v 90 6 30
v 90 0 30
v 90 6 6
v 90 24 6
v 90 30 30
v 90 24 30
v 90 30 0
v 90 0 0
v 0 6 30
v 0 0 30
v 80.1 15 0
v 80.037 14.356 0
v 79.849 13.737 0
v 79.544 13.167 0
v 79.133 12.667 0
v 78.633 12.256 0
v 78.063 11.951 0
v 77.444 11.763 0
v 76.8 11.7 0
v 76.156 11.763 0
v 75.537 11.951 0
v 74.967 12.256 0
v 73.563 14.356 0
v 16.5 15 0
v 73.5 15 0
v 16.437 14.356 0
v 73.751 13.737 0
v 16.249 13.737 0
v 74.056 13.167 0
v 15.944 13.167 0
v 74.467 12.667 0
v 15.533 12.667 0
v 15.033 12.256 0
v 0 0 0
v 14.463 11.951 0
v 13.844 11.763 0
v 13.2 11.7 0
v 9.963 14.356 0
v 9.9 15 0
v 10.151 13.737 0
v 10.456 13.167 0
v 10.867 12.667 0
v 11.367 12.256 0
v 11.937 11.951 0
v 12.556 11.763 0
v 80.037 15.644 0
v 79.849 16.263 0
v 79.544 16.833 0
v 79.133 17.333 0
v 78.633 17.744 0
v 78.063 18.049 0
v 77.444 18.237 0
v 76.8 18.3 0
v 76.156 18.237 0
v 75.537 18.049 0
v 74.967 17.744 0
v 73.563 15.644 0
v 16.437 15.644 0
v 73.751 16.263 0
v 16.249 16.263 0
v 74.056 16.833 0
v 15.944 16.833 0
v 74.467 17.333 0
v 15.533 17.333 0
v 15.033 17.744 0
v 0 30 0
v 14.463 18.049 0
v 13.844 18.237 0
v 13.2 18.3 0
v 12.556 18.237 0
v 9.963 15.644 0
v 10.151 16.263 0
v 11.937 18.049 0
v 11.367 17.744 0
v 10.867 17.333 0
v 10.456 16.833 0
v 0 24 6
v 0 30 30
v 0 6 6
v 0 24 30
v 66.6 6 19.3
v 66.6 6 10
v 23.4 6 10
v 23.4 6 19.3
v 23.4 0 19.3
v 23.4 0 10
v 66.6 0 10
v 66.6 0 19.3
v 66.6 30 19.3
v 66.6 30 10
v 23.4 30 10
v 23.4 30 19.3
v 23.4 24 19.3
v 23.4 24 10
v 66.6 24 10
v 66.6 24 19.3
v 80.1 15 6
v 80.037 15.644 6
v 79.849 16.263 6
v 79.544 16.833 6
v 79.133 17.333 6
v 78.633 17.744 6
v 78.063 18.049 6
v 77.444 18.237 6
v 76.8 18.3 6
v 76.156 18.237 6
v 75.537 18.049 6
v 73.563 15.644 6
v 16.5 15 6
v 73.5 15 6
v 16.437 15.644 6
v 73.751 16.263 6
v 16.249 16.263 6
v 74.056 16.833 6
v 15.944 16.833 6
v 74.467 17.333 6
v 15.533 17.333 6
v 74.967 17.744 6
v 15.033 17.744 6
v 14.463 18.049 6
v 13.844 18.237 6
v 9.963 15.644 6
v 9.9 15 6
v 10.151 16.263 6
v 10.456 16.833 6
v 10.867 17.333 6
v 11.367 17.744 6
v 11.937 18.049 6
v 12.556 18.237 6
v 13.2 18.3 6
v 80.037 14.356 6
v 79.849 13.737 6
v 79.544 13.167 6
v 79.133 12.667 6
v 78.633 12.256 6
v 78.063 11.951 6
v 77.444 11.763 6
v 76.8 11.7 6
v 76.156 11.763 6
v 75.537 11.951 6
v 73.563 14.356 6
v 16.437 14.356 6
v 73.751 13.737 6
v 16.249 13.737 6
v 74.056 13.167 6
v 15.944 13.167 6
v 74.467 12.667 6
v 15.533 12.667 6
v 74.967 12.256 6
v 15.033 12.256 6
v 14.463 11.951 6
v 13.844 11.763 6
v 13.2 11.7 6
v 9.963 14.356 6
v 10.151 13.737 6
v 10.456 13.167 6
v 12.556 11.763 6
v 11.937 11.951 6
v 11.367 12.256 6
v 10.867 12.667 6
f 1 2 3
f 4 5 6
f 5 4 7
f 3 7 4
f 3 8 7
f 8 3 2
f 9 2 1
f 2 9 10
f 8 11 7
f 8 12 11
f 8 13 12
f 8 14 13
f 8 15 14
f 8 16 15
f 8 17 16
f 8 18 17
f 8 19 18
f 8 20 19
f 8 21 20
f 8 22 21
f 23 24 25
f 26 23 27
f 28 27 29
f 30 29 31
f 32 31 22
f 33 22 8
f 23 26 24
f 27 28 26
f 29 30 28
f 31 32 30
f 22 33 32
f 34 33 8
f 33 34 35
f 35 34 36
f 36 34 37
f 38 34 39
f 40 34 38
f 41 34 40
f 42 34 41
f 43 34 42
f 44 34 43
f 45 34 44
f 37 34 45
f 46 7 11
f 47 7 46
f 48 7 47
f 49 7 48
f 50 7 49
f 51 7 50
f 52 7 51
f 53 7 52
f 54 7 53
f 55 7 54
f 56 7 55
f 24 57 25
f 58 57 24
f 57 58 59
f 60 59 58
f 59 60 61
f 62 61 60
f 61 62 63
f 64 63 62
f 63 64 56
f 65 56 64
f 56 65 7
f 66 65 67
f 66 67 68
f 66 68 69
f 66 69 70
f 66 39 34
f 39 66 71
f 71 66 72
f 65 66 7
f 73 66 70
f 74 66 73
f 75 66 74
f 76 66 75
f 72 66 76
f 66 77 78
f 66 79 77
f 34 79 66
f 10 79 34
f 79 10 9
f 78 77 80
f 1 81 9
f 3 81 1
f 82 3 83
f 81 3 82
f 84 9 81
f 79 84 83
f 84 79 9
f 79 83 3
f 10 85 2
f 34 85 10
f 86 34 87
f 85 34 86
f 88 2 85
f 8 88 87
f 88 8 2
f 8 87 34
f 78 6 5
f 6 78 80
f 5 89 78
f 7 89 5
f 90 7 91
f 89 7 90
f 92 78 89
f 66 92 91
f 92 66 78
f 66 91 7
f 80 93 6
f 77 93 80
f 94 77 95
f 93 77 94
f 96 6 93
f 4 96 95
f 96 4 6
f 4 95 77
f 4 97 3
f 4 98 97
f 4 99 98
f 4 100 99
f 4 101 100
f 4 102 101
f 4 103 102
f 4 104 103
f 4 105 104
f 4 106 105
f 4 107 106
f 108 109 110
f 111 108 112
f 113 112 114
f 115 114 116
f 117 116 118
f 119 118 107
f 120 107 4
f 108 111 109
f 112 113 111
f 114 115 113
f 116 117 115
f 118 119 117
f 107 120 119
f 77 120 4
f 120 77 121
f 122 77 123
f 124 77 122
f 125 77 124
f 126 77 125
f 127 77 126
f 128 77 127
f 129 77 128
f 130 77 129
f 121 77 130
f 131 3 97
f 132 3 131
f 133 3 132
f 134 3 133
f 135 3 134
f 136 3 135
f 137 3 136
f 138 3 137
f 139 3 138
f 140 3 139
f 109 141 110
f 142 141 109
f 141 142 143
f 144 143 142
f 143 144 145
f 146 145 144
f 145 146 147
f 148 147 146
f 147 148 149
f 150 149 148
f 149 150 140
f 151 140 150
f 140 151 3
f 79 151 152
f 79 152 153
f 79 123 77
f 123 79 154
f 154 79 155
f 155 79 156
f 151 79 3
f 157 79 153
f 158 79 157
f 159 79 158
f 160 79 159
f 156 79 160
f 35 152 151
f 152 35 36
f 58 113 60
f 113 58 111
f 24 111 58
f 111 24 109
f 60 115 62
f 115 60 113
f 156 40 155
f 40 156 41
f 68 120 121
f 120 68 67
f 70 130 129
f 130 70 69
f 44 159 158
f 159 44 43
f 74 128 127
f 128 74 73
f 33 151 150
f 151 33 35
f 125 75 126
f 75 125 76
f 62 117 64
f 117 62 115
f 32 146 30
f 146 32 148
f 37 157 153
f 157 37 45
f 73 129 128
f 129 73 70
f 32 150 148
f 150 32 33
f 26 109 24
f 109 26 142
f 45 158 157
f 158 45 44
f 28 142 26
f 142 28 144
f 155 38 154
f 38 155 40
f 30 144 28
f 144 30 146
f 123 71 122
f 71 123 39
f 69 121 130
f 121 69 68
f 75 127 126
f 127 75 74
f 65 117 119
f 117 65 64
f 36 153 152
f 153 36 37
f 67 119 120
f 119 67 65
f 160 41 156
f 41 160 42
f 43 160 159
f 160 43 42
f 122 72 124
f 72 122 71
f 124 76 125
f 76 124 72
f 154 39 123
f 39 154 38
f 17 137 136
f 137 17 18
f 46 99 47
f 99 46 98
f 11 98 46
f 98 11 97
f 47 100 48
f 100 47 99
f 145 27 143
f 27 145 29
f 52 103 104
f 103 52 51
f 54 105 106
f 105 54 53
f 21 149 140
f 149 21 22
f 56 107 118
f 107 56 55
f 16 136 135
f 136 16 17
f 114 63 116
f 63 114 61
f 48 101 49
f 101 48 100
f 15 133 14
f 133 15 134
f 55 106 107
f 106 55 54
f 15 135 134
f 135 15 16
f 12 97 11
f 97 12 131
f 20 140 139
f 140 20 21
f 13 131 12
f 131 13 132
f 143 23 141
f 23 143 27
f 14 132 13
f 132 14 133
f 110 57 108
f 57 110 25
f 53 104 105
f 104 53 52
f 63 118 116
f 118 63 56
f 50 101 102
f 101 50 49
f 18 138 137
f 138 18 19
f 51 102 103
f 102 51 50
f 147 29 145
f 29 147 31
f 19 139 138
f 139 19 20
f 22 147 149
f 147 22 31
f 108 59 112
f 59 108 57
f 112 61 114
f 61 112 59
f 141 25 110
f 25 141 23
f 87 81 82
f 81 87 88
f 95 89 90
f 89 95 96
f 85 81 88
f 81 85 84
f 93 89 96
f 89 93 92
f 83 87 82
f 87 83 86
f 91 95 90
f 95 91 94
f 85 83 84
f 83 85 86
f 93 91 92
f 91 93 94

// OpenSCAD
$fn = 32;

// ----------------------------------------------------------------------
// U-bracket: 90 x 30 x 30 mm
// ----------------------------------------------------------------------

// --- parameters (mm) ---
rail_len = 90;            // outer length, X
jaw_w = 30;               // outer width, Y
jaw_h = 30;               // upright height, Z
web_t = 6;                // wall thickness
hole_d = 6.6;             // clearance for M6
window_l = 43.2;          // window length
window_h = 9.3;           // window height

module hole_z(px, py) {
  translate([px, py, -2.5]) cylinder(h = web_t + 5, d = hole_d);
}
module hole_y_pz(pz) {
  /* through both uprights along Y */
  translate([0, -2.5, pz]) rotate([-90, 0, 0]) cylinder(h = jaw_w + 5, d = hole_d);
}

module base() {
  cube([rail_len, jaw_w, web_t]);
}

module uprights() {
  cube([rail_len, web_t, jaw_h]);
  translate([0, jaw_w - web_t, 0]) cube([rail_len, web_t, jaw_h]);
}

difference() {
  union() {
    base();
    uprights();
  }
  hole_z(13.2, 15);
  hole_z(76.8, 15);
  /* lightening window through both uprights */
  translate([rail_len / 2 - window_l / 2, -1, web_t + 4])
    cube([window_l, jaw_w + 2, window_h]);
}
